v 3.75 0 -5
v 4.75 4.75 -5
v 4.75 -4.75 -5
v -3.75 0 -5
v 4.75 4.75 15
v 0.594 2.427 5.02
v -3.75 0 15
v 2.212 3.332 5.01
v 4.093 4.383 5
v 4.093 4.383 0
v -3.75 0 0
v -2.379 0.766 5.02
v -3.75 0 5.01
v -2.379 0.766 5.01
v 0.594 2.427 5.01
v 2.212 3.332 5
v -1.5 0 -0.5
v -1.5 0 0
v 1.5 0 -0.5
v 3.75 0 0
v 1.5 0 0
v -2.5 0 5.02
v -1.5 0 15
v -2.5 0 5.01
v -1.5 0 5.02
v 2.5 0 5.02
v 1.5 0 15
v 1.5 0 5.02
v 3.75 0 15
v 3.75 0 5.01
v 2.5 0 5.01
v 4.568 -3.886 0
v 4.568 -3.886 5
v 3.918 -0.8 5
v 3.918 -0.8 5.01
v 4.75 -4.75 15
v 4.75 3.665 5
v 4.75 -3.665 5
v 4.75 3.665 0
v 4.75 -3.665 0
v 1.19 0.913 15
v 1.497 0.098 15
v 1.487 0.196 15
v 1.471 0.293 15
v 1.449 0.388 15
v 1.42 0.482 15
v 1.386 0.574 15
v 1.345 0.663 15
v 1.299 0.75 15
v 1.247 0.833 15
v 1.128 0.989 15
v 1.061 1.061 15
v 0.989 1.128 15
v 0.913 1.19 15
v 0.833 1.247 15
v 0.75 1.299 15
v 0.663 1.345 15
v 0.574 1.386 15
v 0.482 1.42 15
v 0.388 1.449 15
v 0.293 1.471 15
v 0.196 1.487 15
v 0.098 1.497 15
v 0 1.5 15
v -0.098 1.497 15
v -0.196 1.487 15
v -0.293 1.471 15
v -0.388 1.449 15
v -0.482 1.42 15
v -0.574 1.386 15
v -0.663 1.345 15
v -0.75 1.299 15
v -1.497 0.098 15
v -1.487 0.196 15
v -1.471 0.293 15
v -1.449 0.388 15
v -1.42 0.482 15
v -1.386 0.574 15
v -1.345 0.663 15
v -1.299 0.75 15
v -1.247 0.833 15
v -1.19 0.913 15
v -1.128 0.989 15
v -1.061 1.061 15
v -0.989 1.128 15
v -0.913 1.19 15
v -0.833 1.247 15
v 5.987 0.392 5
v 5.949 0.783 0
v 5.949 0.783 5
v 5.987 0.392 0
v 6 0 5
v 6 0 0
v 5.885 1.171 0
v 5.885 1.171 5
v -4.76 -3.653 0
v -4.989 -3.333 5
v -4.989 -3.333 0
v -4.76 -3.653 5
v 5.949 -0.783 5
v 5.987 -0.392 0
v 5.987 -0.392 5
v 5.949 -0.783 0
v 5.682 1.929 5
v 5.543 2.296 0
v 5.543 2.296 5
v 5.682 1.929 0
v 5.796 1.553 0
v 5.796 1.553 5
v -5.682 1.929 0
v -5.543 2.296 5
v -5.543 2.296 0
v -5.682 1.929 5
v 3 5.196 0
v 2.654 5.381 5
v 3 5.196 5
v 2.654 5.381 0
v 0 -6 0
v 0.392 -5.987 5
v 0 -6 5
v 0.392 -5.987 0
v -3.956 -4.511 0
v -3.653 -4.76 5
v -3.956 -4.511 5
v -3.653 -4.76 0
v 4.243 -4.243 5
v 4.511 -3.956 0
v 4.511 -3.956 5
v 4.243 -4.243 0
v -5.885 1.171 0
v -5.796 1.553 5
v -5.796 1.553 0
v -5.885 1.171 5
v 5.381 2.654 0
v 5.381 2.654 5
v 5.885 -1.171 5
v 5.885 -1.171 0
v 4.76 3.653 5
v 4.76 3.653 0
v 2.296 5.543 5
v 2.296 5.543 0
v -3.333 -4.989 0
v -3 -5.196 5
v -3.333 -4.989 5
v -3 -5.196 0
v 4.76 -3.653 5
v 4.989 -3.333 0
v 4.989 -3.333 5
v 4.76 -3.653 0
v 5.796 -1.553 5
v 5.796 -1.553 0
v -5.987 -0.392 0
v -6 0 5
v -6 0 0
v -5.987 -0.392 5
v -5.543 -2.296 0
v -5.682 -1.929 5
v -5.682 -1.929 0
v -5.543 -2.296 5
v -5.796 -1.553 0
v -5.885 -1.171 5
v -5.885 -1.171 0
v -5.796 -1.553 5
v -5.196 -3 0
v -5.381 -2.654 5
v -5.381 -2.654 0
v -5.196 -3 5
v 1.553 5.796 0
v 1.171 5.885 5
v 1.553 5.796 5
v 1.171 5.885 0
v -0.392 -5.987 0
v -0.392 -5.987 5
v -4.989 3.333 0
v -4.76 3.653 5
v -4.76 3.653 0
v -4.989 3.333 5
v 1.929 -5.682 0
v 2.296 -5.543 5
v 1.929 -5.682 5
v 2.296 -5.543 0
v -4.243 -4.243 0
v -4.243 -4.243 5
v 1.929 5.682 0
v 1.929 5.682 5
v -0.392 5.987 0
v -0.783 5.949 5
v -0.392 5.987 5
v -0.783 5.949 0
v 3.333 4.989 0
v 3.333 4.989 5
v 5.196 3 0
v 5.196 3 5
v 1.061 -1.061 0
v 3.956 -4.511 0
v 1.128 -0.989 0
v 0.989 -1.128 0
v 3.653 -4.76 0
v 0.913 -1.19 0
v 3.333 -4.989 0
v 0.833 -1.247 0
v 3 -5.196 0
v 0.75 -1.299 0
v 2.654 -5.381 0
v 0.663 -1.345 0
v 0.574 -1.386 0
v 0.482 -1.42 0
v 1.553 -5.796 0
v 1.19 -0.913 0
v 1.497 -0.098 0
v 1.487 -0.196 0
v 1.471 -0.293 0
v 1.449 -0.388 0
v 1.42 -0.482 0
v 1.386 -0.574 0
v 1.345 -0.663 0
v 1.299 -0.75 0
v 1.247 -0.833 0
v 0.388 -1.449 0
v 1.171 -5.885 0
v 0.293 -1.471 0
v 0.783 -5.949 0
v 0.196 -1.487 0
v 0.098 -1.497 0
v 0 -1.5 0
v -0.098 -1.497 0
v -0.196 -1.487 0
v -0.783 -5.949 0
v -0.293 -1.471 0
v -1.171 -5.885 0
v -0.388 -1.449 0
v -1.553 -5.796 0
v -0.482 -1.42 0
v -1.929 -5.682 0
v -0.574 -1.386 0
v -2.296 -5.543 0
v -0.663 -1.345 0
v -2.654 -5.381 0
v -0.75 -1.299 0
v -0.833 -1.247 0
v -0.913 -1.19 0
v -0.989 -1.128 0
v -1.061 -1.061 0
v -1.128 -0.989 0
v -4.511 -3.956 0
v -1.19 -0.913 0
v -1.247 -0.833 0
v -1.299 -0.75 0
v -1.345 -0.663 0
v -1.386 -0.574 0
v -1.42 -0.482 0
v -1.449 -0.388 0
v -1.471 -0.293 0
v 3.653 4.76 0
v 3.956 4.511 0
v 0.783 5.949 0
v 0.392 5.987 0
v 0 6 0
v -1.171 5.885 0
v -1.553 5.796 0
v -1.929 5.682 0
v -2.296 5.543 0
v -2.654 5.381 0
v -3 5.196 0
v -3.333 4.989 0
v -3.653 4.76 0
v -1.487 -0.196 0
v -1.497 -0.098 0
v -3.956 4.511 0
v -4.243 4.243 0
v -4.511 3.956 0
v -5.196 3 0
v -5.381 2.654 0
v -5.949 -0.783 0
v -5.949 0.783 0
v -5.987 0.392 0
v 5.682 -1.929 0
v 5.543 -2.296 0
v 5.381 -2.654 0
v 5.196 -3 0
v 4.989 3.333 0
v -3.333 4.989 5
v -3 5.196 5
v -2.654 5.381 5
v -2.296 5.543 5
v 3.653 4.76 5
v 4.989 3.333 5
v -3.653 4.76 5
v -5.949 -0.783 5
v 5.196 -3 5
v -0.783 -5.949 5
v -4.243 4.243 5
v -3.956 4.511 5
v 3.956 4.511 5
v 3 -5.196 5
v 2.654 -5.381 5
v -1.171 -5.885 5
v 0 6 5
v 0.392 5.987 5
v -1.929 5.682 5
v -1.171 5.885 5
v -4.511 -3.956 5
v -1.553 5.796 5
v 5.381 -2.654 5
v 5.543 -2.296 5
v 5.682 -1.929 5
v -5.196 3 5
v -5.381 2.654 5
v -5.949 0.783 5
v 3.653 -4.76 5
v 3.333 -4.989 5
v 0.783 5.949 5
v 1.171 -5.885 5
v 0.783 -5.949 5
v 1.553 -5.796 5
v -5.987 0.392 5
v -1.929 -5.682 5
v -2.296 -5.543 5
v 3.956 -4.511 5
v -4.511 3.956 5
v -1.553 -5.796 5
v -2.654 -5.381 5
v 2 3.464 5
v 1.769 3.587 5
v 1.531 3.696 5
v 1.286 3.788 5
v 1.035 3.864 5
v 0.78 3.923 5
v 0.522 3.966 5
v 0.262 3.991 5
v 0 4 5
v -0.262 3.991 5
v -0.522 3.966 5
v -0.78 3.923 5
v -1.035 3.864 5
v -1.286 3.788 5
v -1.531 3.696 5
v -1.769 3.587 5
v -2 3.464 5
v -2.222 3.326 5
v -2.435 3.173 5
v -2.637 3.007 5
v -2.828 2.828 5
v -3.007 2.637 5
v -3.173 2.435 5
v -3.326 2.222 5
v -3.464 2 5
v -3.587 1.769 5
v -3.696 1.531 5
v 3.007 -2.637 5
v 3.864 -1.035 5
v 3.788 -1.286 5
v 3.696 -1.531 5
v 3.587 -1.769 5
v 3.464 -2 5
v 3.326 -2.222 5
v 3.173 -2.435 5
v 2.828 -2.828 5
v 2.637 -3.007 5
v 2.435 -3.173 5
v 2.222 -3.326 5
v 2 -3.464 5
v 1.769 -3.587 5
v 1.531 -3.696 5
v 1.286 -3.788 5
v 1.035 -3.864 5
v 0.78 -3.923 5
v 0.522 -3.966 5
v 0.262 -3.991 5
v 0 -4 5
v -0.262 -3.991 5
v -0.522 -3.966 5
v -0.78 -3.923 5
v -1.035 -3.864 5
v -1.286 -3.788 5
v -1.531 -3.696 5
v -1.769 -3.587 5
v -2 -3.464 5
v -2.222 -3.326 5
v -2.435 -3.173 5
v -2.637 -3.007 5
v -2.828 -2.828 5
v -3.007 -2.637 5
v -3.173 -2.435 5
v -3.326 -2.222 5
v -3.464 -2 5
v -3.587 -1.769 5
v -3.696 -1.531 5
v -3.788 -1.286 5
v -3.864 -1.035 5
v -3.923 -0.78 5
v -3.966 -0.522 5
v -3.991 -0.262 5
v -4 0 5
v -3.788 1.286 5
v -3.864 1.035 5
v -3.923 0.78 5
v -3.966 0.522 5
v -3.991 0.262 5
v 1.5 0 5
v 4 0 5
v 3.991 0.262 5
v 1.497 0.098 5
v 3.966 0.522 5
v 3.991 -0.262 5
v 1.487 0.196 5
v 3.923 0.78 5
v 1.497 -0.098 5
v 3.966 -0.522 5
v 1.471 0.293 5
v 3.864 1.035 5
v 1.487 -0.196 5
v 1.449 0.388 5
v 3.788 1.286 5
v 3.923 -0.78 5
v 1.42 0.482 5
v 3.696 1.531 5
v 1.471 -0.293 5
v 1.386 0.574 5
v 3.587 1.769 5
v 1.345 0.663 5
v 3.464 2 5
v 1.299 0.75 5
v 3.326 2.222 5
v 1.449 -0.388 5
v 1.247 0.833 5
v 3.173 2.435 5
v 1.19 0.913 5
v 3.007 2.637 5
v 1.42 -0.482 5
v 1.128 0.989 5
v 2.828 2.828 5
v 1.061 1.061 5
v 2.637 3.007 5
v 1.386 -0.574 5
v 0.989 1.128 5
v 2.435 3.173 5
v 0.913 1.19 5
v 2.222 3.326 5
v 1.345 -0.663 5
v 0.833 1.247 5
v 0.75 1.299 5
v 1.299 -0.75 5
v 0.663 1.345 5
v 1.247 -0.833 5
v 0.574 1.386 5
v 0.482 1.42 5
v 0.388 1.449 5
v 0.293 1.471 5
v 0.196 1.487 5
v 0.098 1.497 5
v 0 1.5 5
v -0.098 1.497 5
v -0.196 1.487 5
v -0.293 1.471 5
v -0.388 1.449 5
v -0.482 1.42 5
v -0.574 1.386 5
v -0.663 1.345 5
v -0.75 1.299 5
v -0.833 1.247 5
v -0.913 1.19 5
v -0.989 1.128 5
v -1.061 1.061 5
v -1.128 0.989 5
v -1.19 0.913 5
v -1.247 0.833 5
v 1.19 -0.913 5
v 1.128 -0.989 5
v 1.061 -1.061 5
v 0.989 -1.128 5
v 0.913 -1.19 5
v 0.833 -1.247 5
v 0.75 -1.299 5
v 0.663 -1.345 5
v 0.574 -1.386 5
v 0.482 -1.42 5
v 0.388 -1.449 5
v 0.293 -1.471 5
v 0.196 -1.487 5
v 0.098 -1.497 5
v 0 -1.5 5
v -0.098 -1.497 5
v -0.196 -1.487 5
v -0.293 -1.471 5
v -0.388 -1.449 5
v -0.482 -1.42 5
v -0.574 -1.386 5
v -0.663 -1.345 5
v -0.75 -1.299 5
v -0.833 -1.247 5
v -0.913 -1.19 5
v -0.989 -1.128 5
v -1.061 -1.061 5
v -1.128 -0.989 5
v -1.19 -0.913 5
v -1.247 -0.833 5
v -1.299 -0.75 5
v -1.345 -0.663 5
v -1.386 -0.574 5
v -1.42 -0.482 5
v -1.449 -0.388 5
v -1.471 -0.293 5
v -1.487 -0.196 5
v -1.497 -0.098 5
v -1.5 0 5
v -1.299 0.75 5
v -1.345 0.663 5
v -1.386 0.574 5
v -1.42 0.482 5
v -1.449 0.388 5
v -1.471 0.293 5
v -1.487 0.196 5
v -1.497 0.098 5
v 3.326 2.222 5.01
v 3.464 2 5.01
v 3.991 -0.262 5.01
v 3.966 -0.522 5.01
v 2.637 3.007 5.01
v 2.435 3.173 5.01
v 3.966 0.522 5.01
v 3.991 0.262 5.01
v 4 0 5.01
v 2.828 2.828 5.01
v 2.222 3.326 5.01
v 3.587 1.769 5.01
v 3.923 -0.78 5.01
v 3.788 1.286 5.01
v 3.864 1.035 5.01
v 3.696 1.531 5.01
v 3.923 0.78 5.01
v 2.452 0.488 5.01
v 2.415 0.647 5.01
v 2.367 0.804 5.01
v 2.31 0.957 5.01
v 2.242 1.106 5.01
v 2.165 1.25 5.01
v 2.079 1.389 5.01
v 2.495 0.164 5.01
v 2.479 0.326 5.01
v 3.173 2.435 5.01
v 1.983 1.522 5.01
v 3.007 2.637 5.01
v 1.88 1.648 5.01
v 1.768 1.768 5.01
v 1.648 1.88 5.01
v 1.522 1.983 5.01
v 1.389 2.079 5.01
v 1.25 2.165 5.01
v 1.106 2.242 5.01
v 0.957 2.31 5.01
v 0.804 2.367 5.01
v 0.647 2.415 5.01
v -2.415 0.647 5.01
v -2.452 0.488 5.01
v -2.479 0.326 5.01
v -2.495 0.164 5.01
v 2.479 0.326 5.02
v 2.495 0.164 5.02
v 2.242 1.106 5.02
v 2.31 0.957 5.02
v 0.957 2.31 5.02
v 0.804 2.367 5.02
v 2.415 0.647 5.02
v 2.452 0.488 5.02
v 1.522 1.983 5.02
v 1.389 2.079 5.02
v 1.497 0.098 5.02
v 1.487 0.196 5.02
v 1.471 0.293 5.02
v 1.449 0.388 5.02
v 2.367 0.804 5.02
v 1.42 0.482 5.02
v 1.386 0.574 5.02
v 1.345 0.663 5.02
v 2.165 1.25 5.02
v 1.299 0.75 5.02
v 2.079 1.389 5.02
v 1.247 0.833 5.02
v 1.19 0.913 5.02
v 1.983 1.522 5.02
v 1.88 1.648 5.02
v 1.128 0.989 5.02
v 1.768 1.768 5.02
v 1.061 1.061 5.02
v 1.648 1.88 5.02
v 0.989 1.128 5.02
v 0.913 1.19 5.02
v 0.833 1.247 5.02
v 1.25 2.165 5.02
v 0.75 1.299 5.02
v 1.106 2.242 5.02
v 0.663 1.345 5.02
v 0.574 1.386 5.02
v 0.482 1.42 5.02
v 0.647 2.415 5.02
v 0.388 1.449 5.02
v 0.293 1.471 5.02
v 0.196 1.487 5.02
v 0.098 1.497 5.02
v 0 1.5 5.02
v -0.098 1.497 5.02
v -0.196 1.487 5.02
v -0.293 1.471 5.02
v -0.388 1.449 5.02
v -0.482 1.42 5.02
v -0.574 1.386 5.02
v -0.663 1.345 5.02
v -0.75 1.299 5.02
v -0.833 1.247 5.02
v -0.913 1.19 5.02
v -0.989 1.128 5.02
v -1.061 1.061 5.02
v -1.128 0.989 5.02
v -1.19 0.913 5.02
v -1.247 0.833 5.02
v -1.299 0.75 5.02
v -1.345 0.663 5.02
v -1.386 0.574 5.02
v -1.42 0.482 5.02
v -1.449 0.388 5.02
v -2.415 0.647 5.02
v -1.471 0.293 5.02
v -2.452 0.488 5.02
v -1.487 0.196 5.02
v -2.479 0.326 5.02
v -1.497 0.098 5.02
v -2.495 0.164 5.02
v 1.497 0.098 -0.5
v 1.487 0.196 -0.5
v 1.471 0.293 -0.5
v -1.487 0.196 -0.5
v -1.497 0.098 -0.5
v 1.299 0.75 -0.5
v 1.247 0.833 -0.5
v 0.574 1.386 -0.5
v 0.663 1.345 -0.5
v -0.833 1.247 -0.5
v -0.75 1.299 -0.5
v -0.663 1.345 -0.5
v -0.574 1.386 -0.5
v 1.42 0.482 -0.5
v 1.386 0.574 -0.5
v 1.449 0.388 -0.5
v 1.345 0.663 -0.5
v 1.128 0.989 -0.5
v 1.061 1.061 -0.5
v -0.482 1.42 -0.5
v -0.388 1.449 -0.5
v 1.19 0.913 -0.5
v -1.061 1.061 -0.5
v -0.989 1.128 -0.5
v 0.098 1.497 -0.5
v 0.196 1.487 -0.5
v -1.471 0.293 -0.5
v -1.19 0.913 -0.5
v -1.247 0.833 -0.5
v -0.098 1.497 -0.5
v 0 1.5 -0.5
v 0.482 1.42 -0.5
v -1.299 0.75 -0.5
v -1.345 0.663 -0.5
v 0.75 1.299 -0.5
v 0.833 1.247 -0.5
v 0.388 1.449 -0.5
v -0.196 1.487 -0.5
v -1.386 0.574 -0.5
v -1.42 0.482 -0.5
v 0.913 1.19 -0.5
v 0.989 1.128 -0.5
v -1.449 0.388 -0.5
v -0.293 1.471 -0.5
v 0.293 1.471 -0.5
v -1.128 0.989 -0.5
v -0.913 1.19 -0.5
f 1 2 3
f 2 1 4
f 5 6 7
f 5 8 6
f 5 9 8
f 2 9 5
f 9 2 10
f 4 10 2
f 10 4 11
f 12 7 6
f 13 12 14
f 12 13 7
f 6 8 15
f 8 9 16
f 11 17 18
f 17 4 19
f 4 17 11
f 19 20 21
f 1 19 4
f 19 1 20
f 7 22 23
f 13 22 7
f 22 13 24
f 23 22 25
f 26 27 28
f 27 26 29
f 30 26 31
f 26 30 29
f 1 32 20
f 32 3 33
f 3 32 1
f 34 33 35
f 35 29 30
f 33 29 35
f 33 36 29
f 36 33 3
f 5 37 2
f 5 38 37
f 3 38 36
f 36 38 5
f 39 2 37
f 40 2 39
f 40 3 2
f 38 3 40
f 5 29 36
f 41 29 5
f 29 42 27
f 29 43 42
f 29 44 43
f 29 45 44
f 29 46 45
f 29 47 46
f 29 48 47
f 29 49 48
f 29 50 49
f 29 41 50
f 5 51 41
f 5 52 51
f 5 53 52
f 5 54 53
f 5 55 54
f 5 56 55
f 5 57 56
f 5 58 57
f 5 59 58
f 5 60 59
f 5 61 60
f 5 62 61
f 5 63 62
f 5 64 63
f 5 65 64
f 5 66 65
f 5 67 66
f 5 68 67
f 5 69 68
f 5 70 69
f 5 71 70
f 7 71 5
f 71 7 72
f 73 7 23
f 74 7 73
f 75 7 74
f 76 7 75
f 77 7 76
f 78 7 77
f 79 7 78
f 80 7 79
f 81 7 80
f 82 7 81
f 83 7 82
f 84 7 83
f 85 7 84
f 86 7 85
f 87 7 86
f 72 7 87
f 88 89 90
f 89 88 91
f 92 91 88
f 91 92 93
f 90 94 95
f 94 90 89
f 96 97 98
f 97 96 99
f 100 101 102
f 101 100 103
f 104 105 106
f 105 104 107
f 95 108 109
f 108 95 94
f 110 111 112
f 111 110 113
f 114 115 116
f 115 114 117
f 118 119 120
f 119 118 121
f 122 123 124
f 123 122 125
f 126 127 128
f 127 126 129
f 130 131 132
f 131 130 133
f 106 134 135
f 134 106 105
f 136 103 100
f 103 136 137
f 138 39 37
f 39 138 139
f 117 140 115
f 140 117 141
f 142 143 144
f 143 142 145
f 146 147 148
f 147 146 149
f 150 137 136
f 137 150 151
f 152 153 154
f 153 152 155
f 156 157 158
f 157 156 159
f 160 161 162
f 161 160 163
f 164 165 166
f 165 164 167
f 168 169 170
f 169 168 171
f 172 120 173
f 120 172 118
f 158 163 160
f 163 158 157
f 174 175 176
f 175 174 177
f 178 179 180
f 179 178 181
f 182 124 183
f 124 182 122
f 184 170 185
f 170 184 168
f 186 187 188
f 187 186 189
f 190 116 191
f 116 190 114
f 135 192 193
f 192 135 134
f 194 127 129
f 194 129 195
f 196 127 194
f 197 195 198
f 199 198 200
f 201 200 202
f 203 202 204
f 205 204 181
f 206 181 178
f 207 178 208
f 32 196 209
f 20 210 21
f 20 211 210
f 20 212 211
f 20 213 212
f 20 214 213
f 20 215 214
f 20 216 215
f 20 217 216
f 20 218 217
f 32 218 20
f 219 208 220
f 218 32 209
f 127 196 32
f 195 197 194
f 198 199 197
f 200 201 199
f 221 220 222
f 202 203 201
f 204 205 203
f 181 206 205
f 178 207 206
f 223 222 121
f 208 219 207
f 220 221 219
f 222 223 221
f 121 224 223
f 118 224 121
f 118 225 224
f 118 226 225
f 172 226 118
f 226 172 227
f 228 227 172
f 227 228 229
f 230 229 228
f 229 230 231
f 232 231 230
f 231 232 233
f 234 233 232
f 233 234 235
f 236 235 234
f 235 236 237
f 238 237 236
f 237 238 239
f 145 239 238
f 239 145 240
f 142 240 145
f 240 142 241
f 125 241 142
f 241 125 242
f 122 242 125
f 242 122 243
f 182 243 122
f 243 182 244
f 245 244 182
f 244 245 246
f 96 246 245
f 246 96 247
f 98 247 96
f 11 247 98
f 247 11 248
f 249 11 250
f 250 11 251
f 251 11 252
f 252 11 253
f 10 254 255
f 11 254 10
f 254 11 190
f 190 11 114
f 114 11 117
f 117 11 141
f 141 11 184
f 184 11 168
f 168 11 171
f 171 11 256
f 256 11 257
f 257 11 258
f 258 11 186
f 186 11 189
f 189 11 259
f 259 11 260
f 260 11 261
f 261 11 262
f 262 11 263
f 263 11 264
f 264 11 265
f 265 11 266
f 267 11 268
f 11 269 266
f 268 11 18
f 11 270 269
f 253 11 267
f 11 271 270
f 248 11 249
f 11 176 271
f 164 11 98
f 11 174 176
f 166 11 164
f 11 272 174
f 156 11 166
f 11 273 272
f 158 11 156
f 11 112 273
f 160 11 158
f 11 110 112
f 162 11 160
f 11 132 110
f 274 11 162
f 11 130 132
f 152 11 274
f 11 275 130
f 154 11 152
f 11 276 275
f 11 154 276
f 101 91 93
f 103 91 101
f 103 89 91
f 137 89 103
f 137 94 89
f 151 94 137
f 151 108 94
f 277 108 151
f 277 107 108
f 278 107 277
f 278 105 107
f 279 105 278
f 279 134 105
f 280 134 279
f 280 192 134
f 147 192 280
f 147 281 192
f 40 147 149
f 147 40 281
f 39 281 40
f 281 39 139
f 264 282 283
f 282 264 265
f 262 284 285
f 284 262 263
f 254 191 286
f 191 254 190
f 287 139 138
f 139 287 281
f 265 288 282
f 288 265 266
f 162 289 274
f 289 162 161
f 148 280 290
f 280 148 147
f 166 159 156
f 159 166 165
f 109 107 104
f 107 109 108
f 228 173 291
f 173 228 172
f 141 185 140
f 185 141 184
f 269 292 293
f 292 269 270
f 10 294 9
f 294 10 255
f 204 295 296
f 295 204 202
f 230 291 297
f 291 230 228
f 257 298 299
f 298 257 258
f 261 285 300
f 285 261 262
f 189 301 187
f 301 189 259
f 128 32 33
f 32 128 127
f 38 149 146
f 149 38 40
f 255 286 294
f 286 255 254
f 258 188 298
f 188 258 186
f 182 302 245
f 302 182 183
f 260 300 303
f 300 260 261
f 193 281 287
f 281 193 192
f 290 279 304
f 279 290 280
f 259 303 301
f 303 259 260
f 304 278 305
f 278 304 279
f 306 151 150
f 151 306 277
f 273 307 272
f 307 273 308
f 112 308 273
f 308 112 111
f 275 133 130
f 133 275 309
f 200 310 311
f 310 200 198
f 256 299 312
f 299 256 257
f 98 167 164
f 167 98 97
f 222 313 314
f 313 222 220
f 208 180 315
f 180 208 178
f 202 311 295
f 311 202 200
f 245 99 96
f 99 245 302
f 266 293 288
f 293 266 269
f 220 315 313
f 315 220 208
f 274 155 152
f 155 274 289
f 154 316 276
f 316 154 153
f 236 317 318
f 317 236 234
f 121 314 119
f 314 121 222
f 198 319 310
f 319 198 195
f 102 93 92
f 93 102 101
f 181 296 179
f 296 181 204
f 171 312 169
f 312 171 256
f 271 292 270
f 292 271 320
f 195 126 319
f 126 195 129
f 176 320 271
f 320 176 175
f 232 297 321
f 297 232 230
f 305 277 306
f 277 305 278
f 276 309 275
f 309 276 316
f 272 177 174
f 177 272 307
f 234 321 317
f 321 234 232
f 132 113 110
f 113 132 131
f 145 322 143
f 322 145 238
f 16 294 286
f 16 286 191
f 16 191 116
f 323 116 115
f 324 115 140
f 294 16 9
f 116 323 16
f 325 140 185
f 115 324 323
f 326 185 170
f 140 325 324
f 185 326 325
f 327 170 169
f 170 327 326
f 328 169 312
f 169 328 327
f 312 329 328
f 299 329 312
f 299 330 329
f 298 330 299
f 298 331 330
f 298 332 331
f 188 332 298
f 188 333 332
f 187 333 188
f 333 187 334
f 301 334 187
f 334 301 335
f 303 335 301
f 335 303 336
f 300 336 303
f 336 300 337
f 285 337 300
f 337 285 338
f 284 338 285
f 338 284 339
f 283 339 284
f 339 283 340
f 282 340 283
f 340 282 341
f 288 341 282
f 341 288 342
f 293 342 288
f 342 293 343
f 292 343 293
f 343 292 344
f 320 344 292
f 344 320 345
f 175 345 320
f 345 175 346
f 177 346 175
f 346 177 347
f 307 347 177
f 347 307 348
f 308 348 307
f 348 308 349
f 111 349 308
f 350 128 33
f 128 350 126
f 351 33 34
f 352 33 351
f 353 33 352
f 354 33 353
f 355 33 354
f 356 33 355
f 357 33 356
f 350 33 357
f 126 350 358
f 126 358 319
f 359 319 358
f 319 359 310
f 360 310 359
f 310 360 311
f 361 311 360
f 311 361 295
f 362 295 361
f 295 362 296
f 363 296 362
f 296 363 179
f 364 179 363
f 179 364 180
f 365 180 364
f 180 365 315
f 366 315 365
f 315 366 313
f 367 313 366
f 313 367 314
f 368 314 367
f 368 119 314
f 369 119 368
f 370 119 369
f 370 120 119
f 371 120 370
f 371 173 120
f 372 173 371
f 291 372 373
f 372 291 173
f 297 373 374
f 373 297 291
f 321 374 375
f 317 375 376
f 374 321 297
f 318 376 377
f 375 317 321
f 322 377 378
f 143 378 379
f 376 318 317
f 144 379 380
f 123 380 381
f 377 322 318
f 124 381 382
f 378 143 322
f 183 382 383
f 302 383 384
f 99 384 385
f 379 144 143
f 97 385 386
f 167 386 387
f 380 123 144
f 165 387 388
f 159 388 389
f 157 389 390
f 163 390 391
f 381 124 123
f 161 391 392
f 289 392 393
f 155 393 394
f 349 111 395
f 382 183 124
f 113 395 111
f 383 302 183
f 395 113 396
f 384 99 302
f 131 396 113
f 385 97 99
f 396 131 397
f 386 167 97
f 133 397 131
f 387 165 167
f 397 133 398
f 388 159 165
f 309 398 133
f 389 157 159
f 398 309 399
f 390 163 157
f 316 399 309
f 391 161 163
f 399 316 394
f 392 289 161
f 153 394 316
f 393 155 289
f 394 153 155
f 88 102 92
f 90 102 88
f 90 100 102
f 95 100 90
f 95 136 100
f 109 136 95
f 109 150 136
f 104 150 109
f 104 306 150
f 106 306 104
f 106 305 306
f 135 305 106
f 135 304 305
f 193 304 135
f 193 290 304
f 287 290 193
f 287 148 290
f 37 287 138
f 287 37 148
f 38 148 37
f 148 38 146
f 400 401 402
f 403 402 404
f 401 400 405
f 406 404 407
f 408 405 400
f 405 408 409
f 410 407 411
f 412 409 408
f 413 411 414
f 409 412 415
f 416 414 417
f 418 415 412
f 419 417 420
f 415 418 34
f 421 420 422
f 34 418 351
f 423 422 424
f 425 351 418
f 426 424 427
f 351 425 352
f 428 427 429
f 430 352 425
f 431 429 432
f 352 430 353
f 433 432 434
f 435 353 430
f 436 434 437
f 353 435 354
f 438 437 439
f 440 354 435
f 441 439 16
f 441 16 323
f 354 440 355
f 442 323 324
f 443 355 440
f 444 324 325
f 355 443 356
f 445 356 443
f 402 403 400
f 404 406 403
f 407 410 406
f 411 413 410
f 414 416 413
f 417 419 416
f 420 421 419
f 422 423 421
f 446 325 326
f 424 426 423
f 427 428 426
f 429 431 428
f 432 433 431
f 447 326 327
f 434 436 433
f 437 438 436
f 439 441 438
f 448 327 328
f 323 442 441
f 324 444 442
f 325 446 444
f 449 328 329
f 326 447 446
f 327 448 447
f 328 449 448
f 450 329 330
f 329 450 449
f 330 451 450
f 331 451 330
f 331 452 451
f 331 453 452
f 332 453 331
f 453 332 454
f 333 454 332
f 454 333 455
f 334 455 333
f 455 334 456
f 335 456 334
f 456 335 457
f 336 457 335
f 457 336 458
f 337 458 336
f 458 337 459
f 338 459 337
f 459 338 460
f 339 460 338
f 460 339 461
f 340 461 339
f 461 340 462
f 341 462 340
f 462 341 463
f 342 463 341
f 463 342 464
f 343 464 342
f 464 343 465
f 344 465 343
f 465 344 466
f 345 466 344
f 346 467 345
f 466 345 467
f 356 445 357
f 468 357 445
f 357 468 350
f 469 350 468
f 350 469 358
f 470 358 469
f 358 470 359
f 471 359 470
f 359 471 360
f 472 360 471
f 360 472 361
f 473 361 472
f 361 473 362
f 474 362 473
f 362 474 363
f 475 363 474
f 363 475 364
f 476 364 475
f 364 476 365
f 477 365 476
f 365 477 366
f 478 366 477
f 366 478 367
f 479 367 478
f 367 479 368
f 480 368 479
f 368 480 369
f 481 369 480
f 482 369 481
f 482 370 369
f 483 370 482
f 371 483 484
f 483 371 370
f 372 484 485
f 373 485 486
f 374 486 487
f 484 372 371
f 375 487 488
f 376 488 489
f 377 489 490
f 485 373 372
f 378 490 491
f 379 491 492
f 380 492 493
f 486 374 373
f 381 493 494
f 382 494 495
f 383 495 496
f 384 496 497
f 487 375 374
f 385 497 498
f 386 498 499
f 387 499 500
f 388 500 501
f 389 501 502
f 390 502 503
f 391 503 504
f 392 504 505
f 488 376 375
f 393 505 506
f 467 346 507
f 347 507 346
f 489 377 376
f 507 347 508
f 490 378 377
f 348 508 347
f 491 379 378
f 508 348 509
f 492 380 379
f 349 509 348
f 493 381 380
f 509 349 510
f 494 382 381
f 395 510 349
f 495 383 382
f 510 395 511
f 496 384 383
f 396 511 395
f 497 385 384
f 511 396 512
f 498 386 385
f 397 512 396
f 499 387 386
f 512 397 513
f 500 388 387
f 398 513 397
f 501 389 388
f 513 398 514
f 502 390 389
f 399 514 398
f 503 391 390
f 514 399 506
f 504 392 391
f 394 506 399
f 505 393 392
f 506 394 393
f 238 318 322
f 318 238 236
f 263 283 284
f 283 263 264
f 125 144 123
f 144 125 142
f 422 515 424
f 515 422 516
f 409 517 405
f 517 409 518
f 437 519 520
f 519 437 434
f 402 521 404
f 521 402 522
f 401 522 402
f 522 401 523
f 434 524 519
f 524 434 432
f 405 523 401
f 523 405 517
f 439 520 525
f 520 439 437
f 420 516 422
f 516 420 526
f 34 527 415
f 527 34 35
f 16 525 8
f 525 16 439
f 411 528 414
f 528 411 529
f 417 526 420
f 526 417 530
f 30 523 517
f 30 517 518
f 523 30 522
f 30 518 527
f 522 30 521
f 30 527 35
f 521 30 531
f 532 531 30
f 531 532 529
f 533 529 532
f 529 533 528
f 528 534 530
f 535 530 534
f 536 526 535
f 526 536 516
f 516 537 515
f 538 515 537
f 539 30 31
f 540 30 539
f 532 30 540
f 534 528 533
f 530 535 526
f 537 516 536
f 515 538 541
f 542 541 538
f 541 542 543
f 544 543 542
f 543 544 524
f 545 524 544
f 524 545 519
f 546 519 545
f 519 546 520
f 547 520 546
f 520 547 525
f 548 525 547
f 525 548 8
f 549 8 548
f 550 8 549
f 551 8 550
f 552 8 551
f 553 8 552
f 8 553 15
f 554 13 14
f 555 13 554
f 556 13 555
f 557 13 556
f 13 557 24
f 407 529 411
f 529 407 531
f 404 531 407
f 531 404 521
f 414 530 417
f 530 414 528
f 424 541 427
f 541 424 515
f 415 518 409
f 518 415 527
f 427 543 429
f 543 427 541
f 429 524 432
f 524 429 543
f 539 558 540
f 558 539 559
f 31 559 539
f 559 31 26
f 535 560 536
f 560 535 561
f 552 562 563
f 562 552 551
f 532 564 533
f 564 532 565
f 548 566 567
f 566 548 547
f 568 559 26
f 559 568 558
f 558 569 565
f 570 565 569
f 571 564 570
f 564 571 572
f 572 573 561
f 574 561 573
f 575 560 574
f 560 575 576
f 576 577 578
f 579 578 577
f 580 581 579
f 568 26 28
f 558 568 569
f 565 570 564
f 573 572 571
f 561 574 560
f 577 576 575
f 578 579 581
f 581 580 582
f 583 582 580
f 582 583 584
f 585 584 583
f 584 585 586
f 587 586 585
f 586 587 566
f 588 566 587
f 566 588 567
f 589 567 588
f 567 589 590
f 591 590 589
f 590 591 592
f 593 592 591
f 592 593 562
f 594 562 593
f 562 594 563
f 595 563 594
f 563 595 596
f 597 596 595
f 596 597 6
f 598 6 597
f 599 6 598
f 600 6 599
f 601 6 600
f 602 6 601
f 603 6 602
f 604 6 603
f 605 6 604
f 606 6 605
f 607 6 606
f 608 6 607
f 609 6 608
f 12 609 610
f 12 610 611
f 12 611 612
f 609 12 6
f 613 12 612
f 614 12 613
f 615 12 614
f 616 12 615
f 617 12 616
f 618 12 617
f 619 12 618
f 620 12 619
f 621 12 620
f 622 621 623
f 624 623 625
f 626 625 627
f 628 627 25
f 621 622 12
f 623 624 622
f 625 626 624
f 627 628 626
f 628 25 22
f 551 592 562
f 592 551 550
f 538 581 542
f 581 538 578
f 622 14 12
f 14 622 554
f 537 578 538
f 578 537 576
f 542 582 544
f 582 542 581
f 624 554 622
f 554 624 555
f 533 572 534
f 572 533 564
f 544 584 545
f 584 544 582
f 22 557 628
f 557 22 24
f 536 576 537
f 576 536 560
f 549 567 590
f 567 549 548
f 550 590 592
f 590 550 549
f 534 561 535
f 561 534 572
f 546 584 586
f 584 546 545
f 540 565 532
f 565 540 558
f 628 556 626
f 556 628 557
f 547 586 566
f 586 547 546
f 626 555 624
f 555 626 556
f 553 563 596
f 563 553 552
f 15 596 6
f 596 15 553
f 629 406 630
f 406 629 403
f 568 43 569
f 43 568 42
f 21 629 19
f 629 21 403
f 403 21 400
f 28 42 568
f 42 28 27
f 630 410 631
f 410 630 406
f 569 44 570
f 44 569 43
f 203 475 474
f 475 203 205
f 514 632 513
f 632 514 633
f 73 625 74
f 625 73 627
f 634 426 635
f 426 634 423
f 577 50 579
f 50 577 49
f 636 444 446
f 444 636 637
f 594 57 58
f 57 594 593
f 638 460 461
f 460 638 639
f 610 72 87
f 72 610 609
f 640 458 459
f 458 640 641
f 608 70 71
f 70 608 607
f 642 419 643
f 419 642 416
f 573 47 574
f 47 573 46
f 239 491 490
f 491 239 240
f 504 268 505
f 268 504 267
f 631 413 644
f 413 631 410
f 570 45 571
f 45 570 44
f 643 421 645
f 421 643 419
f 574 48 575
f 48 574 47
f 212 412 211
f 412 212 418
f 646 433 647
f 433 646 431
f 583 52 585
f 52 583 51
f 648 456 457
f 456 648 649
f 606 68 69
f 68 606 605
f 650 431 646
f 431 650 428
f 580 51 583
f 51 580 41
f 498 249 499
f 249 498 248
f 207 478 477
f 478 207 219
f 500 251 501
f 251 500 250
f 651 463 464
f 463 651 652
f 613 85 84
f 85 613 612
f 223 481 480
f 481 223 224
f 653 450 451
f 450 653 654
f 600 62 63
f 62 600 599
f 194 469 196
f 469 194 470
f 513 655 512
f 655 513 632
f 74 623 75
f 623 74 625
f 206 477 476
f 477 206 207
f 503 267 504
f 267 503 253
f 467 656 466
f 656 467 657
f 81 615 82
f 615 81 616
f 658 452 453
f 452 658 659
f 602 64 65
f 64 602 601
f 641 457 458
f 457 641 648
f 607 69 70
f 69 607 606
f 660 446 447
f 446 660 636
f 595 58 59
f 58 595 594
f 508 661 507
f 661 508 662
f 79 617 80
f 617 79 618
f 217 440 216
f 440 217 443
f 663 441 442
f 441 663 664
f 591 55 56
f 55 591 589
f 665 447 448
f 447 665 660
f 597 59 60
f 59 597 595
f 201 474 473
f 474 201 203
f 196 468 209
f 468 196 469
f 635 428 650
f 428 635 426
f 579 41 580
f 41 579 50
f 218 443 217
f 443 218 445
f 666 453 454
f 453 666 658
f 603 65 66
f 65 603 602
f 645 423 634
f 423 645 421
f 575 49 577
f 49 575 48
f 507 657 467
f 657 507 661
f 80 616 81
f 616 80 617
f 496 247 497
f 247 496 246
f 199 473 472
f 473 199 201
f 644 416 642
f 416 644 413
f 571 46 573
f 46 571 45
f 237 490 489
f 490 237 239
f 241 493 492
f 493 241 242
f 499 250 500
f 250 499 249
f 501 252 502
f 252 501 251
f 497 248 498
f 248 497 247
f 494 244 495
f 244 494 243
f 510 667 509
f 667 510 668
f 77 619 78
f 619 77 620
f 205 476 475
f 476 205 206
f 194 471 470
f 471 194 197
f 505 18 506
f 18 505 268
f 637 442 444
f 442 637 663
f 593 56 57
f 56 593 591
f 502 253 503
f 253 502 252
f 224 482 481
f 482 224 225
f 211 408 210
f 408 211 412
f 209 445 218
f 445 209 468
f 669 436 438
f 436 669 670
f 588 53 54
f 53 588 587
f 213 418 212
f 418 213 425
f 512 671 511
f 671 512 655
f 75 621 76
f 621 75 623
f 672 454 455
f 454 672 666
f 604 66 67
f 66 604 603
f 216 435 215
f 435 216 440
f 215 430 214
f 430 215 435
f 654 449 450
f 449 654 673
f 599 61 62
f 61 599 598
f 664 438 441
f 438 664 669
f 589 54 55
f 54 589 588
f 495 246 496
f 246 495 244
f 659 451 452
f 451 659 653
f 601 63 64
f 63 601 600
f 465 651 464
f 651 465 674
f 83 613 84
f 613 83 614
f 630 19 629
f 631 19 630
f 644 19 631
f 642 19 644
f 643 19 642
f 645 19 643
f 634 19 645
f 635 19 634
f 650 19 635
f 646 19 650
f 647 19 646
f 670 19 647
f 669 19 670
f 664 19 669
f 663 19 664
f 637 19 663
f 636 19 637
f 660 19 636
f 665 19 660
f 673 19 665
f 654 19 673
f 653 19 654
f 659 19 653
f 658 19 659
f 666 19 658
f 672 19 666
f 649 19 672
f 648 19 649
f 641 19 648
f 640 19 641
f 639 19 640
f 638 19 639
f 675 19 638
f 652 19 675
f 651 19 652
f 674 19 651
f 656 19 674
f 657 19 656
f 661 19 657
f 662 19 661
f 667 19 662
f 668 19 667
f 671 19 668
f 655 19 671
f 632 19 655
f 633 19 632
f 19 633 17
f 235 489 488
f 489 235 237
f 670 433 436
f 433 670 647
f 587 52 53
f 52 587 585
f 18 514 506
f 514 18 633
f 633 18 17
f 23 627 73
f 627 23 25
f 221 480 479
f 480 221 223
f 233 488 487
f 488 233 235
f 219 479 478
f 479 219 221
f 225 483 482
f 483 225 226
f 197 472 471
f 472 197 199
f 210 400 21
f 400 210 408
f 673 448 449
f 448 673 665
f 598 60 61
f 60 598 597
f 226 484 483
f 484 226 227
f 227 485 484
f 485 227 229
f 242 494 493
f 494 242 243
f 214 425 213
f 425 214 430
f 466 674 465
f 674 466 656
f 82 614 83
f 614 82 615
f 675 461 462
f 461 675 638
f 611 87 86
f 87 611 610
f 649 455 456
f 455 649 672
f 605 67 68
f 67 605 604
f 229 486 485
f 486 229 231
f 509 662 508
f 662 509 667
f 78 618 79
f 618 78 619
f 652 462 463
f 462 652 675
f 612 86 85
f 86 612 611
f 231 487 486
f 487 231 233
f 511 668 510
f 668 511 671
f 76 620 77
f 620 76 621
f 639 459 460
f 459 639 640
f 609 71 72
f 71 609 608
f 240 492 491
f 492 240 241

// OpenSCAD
// Hose-barb reducer: joins 8 mm and 5 mm silicone tubing
// Print orientation: standing upright along +Z

// ---------- Parameters ----------
t8_d      = 8;     // 8 mm tubing inner diameter
t5_d      = 5;     // 5 mm tubing inner diameter
bore_d    = 3;     // through-bore diameter
z0        = 0;     // start of 8 mm section
z1        = 20;    // start of collar
z2        = 25;    // start of 5 mm section
z3        = 41;    // end of part
barb_h8   = 10;    // 8 mm barb height
barb_h5   = 8;     // 5 mm barb height
od8_bot   = 7.5;   // 8 mm barb outer diameter at bottom
od8_top   = 9.5;   // 8 mm barb outer diameter at top step
od5_bot   = 6.5;   // 5 mm barb outer diameter at bottom
od5_top   = 5.0;   // 5 mm barb outer diameter at top step
collar_d  = 12;    // collar diameter
eps       = 0.5;   // overshoot for clean cuts

$fn = 96;

// ---------- Model ----------
difference() {
    union() {
        // 8 mm section: two stacked sawtooth barbs
        for (s = [-1, 1])
            translate([0, 0, z0 + s * barb_h8 / 2])
                linear_extrude(height = barb_h8)
                    polygon([[-od8_bot / 2, 0], [od8_bot / 2, 0],
                             [od8_top / 2, -od8_top / 2], [od8_top / 2, od8_top / 2]]);
        // collar
        cylinder(d = collar_d, h = z2 - z1);
        // 5 mm section: two stacked sawtooth barbs
        for (s = [-1, 1])
            translate([0, 0, z2 + s * barb_h5 / 2])
                linear_extrude(height = barb_h5)
                    polygon([[-od5_bot / 2, 0], [od5_bot / 2, 0],
                             [od5_top / 2, -od5_top / 2], [od5_top / 2, od5_top / 2]]);
    }
    // through bore
    translate([0, 0, -eps])
        cylinder(d = bore_d, h = z3 - z0 + 2 * eps);
    // tubing bores in each barb
    for (z = [z0 + barb_h8 / 2, z2 + barb_h5 / 2])
        translate([0, 0, z])
            cylinder(d = t8_d, h = 0.01);   // 8 mm
    for (z = [z0 + barb_h8 / 2 + 0.01, z2 + barb_h5 / 2 + 0.01])
        translate([0, 0, z])
            cylinder(d = t5_d, h = 0.01);   // 5 mm
}
